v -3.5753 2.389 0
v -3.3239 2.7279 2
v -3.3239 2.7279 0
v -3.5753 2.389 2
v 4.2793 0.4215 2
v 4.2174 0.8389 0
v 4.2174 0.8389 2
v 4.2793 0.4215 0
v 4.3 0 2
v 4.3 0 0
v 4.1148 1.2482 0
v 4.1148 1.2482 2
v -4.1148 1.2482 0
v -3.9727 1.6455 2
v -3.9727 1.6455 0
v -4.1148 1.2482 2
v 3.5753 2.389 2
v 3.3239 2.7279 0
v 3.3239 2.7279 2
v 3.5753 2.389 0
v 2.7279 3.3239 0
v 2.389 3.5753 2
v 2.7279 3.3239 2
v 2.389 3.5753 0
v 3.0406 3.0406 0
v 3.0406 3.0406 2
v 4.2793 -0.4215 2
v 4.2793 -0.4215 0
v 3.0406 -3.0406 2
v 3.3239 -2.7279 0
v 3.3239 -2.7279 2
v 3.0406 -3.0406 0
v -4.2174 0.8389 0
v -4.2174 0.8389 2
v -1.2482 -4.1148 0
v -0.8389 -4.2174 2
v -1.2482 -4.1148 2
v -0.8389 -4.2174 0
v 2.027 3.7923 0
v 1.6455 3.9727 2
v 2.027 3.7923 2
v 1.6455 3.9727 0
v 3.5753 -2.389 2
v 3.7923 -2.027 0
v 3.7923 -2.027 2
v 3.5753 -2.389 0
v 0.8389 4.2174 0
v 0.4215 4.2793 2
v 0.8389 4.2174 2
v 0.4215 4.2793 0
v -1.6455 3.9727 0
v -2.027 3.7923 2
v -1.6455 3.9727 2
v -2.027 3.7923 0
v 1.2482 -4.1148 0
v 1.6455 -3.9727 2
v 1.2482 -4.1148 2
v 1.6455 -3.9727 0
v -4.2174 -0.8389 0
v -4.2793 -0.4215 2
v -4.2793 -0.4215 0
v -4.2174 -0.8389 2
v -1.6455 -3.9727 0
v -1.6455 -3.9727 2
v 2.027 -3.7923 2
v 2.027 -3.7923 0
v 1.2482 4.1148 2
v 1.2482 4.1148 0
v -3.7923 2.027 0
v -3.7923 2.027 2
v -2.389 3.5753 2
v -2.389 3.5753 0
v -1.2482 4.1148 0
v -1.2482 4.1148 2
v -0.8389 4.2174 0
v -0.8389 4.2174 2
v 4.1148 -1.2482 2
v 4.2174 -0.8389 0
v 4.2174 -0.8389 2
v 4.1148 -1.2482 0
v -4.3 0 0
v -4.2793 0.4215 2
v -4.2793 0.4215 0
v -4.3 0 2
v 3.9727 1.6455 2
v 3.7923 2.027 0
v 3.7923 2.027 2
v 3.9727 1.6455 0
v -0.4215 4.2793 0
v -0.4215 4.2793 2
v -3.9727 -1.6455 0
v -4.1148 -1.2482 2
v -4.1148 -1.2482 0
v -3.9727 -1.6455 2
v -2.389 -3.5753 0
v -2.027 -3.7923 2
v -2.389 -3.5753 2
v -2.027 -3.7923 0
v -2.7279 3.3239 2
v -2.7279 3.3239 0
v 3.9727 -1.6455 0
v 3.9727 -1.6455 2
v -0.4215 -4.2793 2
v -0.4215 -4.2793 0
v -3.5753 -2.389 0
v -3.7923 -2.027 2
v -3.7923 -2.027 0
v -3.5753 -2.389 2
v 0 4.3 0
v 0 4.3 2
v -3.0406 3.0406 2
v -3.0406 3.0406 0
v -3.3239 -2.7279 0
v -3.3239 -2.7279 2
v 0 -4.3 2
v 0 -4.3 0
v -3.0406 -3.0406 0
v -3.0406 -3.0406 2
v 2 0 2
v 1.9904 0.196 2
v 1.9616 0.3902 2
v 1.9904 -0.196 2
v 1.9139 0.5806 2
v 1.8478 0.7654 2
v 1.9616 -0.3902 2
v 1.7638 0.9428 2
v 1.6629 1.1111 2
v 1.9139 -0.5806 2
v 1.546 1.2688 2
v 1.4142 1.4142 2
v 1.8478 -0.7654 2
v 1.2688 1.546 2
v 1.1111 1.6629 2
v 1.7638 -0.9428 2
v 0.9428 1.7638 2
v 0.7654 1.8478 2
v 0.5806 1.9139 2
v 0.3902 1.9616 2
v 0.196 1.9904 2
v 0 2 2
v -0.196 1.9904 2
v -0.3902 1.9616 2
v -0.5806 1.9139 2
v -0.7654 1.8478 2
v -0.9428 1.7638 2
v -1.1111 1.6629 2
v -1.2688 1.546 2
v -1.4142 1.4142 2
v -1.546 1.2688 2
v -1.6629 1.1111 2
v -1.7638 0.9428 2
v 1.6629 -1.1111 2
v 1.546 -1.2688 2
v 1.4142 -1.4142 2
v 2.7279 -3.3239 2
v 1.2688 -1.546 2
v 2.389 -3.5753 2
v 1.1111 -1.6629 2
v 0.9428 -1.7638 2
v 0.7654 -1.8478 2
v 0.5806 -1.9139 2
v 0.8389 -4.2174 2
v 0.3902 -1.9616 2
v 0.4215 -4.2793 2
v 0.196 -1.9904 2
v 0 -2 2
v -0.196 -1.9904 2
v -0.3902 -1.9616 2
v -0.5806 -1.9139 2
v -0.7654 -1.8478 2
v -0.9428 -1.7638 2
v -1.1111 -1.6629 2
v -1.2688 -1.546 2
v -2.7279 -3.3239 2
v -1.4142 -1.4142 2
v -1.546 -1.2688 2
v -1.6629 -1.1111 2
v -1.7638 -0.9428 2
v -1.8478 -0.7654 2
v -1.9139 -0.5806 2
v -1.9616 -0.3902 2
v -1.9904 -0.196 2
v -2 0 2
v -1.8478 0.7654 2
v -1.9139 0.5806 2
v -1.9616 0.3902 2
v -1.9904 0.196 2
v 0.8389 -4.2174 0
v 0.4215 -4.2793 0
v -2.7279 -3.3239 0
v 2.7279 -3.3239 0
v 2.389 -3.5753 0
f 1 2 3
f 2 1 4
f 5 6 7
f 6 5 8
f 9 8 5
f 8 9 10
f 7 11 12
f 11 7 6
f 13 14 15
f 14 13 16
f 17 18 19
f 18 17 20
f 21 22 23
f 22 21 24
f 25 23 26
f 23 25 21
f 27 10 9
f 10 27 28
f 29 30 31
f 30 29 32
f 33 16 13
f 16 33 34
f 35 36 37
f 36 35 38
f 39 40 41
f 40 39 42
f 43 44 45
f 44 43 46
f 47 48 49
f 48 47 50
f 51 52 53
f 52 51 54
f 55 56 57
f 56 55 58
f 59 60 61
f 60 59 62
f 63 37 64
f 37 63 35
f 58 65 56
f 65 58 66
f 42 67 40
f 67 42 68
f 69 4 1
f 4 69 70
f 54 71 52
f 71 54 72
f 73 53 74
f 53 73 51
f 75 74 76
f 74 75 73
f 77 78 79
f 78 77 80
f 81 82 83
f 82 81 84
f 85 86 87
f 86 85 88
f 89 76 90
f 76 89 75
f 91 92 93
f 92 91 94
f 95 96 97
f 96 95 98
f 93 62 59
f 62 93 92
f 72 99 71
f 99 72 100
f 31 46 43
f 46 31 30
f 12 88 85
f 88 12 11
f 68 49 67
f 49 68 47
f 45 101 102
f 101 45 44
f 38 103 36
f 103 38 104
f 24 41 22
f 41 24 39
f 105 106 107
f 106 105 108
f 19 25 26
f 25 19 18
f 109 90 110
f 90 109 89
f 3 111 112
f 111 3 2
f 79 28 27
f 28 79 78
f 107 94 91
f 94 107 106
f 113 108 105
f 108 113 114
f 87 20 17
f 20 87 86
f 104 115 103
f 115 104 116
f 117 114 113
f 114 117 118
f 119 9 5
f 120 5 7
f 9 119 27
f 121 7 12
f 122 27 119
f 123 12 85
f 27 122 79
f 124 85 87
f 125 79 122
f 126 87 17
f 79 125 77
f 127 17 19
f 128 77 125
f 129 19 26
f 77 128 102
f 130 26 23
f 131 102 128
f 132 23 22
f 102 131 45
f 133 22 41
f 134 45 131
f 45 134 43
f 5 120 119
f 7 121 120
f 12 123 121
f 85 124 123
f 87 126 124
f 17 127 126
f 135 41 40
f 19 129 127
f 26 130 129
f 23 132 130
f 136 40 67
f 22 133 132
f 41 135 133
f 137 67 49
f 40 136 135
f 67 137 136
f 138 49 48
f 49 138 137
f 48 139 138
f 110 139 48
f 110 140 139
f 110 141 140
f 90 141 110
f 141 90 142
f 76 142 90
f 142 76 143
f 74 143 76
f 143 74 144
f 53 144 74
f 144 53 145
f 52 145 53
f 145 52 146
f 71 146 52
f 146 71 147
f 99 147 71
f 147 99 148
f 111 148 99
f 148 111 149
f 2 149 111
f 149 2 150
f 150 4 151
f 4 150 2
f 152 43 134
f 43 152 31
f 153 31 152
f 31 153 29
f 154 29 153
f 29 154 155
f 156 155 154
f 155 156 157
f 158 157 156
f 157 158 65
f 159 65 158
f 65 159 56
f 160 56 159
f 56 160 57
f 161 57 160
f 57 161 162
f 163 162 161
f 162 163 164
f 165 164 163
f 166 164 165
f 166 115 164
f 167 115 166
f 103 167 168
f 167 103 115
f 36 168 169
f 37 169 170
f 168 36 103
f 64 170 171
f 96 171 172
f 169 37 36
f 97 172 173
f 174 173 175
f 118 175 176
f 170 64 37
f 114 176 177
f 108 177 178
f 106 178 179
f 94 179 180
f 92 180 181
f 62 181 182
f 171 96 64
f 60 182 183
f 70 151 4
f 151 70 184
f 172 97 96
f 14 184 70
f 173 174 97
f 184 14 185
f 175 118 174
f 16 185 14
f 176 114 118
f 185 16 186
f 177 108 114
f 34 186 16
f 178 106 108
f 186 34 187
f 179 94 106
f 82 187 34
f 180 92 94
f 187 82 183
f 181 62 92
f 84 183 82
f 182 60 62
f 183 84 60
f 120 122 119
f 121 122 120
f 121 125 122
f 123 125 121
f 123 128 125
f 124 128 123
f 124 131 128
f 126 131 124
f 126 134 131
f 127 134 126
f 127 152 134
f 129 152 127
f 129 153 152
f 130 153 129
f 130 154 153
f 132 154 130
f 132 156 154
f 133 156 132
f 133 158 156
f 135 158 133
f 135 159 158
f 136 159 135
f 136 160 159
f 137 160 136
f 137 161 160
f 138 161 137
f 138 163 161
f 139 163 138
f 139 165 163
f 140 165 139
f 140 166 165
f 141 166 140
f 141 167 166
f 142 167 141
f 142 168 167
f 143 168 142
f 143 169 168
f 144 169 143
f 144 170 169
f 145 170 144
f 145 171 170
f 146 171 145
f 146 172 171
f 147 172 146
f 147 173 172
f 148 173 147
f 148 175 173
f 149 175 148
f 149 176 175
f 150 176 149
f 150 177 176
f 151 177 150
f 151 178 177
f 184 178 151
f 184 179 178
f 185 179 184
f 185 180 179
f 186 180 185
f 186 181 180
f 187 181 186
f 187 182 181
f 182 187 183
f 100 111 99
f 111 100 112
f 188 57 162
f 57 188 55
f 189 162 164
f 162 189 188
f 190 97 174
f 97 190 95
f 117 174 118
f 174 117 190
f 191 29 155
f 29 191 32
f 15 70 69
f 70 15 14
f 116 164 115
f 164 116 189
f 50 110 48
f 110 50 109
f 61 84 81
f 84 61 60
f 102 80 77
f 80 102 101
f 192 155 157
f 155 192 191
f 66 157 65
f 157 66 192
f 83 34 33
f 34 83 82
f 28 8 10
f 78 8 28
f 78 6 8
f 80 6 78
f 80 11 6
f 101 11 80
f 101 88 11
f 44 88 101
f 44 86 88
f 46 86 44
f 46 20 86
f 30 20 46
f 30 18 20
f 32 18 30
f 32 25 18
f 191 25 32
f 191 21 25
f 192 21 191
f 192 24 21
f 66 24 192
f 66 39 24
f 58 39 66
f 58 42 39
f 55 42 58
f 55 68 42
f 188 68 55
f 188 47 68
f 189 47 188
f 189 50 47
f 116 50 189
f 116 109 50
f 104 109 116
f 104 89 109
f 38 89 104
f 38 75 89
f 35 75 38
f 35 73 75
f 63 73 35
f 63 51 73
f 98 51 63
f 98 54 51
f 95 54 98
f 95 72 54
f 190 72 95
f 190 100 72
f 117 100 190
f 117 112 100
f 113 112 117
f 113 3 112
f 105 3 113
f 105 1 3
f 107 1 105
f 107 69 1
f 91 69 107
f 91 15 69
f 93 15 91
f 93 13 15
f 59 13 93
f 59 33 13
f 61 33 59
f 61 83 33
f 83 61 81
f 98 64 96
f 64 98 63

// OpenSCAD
module stepped_cylinder() {
    difference() {
        // Flange
        cylinder(h=2.0, d=8.6, $fn=64);
        // Boss
        translate([0, 0, 2.0])
            cylinder(h=4.2, d=4.0, $fn=64);
    }
}

stepped_cylinder();
